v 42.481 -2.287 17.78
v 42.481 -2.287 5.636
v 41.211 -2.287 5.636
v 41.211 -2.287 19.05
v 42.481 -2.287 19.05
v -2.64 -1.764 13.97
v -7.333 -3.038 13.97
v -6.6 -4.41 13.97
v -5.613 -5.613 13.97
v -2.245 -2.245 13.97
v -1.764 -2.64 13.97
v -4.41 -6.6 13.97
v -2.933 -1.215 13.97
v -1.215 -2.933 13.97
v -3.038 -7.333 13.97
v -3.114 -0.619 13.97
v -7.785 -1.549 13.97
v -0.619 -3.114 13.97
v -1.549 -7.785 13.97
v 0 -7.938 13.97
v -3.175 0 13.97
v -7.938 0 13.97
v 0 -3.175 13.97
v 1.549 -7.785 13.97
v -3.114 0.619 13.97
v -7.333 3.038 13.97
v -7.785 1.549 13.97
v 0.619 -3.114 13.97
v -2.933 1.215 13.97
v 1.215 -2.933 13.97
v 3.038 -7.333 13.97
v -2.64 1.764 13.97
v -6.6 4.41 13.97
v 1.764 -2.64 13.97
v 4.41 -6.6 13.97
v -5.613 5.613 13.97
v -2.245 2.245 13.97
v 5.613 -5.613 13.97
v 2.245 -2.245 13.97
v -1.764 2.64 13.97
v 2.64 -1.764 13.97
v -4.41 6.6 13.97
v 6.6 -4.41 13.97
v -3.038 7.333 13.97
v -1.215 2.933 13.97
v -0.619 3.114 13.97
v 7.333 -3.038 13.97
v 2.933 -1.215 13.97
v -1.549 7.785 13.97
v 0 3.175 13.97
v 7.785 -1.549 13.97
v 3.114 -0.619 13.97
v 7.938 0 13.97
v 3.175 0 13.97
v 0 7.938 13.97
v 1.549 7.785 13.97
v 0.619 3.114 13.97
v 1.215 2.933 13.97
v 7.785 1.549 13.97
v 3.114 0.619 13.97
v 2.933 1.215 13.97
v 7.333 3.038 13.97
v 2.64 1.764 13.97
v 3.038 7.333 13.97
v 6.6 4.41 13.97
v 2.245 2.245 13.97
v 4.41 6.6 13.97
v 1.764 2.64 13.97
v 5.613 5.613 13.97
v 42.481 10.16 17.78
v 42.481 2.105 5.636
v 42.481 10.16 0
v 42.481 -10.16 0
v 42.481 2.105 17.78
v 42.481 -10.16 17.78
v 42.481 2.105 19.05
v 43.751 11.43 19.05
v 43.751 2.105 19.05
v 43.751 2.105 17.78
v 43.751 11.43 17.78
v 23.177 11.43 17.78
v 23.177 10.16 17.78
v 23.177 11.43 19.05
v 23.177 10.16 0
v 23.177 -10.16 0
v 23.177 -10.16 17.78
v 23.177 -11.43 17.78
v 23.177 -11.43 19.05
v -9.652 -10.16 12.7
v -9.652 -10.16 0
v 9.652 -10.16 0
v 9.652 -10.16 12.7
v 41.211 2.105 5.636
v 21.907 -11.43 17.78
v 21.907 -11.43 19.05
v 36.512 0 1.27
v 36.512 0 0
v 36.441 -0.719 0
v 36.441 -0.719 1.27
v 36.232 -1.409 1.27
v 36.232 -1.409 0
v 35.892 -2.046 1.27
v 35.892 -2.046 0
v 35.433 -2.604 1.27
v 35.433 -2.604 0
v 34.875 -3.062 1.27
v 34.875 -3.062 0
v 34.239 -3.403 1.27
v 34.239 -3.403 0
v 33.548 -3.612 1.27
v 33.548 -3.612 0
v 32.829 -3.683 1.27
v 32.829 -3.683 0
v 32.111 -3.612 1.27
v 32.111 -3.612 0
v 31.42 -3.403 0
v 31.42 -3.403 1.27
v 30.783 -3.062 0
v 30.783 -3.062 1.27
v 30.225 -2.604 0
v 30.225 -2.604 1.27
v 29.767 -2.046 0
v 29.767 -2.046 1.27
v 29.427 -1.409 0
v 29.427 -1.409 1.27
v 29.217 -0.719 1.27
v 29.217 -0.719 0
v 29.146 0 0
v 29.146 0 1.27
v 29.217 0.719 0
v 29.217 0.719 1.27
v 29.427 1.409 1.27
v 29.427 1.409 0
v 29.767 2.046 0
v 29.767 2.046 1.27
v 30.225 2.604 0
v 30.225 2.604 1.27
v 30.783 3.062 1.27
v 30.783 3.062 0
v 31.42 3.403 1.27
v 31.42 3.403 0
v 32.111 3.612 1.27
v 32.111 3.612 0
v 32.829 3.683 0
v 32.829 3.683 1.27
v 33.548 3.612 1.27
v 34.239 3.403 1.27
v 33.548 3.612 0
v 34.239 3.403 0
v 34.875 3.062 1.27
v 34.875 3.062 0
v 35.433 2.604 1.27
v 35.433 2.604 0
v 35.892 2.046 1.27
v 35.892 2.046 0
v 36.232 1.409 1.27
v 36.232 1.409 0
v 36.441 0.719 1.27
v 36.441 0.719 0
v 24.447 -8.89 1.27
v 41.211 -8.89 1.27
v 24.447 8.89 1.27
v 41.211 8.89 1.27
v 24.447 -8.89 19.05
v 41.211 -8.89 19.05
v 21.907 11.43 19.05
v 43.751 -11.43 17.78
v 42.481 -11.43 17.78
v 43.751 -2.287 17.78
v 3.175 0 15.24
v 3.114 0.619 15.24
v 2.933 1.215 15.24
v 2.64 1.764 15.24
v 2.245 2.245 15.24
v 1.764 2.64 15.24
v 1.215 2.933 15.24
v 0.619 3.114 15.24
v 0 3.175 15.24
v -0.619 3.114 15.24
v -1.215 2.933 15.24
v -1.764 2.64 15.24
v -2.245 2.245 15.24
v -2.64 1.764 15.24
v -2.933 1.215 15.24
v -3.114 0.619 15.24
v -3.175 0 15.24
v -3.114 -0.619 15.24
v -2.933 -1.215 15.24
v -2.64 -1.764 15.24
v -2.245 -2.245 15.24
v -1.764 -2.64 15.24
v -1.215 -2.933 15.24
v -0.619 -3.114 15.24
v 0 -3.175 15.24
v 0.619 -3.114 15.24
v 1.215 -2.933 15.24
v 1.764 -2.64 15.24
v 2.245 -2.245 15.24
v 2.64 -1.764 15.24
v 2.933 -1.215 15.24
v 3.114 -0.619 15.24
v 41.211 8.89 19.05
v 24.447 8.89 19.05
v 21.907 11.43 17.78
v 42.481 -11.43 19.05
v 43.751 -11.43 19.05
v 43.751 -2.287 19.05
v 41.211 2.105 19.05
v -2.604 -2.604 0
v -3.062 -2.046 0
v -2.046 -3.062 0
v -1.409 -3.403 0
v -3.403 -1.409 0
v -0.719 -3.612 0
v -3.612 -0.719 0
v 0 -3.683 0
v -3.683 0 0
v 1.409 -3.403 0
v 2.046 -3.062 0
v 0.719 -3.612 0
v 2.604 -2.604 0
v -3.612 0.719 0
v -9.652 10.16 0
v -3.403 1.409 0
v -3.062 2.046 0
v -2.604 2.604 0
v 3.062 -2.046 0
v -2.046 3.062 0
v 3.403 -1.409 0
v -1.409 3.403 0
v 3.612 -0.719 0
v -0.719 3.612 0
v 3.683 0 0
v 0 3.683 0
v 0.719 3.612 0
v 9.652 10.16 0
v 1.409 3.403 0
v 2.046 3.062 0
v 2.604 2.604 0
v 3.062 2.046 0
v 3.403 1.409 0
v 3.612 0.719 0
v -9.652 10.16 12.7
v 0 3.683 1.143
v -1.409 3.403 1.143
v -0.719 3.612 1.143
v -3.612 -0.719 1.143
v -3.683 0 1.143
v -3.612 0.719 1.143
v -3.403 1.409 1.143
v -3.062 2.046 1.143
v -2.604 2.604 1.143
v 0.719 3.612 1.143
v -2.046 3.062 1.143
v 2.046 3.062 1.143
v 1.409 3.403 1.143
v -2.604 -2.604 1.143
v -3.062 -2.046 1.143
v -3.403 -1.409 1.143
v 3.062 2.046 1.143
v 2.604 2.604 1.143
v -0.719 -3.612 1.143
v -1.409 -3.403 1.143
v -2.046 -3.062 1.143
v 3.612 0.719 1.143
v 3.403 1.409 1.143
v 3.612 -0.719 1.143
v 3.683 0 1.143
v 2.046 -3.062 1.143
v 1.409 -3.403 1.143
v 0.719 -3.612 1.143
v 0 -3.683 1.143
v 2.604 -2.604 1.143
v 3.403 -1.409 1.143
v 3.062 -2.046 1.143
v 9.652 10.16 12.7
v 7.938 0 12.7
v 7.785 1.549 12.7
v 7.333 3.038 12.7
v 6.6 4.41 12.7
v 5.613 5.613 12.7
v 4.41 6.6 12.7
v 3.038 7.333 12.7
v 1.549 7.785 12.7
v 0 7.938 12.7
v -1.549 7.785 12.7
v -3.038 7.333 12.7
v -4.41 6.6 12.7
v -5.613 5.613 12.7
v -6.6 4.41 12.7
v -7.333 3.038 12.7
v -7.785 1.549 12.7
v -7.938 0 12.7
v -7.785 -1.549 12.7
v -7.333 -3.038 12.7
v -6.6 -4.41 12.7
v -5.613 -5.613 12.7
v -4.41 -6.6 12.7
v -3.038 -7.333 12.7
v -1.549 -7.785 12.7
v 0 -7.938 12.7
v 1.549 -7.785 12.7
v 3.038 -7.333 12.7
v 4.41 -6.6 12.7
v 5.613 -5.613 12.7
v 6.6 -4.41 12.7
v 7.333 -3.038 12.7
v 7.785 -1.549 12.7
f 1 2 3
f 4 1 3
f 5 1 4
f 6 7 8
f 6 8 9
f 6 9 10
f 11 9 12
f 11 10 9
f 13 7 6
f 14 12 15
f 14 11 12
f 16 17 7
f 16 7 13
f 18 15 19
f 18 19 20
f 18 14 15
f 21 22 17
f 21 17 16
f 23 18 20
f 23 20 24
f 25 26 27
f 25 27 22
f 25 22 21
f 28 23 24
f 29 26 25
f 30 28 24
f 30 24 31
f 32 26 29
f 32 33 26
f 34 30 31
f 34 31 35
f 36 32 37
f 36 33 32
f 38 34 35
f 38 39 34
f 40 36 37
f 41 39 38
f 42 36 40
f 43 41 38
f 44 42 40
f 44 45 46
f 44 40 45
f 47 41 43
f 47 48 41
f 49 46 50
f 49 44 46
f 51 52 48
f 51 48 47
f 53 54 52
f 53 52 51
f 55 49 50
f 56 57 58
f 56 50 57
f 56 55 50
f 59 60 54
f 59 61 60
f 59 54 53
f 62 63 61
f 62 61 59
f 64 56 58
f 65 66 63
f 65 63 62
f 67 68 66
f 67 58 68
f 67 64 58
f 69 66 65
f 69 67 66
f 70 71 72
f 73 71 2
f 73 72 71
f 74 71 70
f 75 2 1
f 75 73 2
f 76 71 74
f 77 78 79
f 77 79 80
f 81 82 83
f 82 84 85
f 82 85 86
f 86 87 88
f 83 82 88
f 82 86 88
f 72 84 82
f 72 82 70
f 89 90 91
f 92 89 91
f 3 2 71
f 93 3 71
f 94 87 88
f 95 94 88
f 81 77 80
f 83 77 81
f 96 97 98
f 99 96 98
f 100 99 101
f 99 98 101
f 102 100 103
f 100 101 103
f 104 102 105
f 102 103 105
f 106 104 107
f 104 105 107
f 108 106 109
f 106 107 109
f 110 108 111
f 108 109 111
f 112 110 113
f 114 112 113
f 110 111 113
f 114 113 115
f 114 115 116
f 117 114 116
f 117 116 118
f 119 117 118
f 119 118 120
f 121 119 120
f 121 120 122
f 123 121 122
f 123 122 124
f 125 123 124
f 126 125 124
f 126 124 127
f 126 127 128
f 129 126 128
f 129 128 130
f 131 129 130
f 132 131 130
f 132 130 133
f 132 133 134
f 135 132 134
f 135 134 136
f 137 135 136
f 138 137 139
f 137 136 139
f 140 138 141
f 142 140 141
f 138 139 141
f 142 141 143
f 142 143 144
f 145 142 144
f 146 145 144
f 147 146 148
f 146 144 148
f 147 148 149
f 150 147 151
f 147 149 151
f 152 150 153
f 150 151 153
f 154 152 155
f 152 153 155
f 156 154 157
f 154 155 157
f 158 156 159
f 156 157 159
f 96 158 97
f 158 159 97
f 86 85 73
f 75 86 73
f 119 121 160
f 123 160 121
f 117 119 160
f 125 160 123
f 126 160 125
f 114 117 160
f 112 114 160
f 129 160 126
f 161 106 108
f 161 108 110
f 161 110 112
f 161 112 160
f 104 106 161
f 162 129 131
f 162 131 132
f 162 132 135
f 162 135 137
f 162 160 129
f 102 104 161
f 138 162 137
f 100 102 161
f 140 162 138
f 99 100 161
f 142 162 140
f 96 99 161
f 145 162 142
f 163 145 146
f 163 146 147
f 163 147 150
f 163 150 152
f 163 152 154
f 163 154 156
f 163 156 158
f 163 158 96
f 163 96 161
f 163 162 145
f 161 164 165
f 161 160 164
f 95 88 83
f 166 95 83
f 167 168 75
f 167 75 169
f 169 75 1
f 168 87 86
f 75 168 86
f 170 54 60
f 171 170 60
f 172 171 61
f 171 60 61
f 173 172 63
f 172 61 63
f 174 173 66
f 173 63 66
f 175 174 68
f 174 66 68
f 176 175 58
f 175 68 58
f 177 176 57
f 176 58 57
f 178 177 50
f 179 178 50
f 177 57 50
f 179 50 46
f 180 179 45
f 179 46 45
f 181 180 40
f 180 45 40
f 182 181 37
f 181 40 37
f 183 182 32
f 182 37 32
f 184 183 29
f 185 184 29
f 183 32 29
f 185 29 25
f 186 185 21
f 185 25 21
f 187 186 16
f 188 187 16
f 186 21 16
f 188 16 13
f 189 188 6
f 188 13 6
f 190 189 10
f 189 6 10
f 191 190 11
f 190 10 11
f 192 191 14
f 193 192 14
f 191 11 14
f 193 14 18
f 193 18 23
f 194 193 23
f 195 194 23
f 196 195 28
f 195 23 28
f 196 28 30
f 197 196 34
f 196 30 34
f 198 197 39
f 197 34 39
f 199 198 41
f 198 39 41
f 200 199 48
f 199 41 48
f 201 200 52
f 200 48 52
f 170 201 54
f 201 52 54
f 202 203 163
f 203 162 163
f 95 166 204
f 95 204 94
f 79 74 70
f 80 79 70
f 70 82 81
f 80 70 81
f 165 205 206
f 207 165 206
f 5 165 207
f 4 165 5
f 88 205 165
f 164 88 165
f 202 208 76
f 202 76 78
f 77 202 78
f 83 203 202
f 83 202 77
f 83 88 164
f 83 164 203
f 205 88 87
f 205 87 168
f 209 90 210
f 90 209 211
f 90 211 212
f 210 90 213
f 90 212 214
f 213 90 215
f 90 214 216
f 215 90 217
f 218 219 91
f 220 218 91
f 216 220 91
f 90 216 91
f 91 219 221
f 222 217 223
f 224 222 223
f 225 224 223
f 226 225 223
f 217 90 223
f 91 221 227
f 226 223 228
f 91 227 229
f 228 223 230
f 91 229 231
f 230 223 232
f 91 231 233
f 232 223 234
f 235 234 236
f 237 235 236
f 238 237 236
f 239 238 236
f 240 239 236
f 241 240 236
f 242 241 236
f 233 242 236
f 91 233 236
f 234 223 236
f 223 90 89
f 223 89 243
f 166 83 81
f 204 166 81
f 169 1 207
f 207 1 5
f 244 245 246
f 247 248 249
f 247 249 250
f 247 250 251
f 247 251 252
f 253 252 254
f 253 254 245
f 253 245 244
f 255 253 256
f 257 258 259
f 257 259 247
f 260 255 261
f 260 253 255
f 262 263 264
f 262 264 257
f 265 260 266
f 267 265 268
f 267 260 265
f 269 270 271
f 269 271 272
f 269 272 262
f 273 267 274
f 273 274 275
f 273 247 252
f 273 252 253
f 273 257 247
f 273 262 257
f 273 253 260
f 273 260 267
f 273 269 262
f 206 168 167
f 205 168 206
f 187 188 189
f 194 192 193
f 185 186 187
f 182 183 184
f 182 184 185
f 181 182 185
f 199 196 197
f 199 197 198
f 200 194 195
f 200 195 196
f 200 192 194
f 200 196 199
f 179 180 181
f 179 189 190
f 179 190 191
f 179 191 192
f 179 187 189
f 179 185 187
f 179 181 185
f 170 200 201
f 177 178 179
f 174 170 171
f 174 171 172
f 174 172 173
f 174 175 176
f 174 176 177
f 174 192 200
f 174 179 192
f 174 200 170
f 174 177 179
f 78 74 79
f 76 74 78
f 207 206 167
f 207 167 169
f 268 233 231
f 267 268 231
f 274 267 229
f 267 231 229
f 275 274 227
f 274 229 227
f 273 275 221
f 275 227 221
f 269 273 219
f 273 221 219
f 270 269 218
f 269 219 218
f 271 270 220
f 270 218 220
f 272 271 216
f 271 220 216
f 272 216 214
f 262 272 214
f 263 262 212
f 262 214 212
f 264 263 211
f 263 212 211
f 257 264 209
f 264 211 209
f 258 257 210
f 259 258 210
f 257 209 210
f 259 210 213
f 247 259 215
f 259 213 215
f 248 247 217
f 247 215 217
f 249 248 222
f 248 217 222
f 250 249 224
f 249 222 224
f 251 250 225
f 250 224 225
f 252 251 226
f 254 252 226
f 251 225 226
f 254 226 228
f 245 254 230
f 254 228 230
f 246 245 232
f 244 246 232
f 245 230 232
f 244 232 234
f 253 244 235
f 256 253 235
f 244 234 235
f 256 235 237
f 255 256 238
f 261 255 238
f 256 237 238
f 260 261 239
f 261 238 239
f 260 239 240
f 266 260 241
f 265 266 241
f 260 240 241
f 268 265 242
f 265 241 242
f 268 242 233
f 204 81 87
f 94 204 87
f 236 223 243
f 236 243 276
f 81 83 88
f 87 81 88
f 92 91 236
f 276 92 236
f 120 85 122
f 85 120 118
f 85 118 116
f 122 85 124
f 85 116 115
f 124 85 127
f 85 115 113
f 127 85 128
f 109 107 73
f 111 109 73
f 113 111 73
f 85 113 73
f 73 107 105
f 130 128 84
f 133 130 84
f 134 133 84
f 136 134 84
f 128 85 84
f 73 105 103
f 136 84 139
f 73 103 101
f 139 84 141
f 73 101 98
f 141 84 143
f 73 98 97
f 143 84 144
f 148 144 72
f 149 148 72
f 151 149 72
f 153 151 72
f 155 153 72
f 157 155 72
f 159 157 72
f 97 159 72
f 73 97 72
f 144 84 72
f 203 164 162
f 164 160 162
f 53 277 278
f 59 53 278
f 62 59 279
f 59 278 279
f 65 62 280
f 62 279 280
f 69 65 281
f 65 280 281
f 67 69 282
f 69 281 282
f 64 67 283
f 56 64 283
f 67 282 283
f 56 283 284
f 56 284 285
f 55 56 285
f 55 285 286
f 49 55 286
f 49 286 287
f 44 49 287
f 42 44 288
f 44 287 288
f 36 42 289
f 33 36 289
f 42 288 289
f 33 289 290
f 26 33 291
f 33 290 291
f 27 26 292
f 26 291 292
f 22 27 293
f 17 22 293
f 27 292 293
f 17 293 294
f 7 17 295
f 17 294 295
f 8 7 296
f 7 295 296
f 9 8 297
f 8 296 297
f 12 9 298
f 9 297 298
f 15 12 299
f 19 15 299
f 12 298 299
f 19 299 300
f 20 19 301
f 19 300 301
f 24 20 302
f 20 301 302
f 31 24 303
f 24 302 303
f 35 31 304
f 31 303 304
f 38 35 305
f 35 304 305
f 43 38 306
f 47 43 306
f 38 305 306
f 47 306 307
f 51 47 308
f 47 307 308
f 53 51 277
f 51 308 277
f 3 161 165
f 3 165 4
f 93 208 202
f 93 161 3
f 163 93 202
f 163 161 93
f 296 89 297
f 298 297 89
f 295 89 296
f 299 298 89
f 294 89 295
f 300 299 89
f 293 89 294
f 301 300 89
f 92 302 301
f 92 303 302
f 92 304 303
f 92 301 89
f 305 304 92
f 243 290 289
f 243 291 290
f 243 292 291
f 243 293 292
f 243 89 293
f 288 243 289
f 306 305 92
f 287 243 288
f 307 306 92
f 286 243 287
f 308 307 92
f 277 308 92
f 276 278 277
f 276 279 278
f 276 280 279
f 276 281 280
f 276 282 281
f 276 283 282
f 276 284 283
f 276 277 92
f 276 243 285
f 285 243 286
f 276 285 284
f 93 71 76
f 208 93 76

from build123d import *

# Parameters (mm, degrees)
F0_W      = 19.304
F0_H      = 20.32
F1_DEPTH  = 12.7
F2_R      = 7.9375
F3_DEPTH  = 1.27
F4_R      = 3.175
F5_DEPTH  = 1.27
F6_R      = 3.683
F7_DEPTH  = 1.143
F8_W      = 19.304
F8_H      = 20.32
F9_DEPTH  = 19.05
F10_T     = -1.27
F11_W     = 4.392277
F11_H     = 13.413998
F12_DEPTH = 1.778
F13_R     = 3.683
F14_DEPTH = 5.08
F15_W     = 19.304
F15_H     = 1.27
F16_DEPTH = 1.27
F17_W     = 19.304
F17_H     = 1.27
F18_DEPTH = 1.27
F20_DEPTH = 1.27
F21_W     = 9.142821
F21_H     = 1.27
F21_W_2   = 9.324902
F22_DEPTH = 1.27


with BuildPart() as f1:
    # F0 (on Top) → F1 (new body)
    with BuildSketch(Plane.XY):
        Rectangle(F0_W, F0_H)
    extrude(amount=F1_DEPTH)

    # F2 (on face) → F3 (join)
    with BuildSketch(Plane.XY.offset(12.7)):
        Circle(F2_R)
    extrude(amount=F3_DEPTH)

    # F4 (on face) → F5 (join)
    with BuildSketch(Plane.XY.offset(13.97)):
        Circle(F4_R)
    extrude(amount=F5_DEPTH)

    # F6 (on face) → F7 (cut)
    with BuildSketch(Plane(origin=(0, 0, 0), x_dir=(1, 0, 0), z_dir=(0, 0, -1))):
        Circle(F6_R)
    extrude(amount=-F7_DEPTH, mode=Mode.SUBTRACT)


with BuildPart() as f9:
    # F8 (on Top) → F9 (new body)
    with BuildSketch(Plane.XY):
        with Locations((32.829224, 0)):
            Rectangle(F8_W, F8_H)
    extrude(amount=F9_DEPTH)

    # F10
    f10_openings = [f9.faces().sort_by_distance(p)[0] for p in [
        (32.829224, 0, 19.05),
    ]]
    offset(amount=F10_T, openings=f10_openings)

    # F11 (on face) → F12 (cut)
    with BuildSketch(Plane.YZ.offset(42.481224)):
        with Locations((-0.091041, 12.343001)):
            Rectangle(F11_W, F11_H)
    extrude(amount=-F12_DEPTH, mode=Mode.SUBTRACT)

    # F13 (on face) → F14 (cut)
    with BuildSketch(Plane(origin=(0, 0, 0), x_dir=(1, 0, 0), z_dir=(0, 0, -1))):
        with Locations((32.829224, 0)):
            Circle(F13_R)
    extrude(amount=-F14_DEPTH, mode=Mode.SUBTRACT)

    # F15 (on face) → F16 (join)
    with BuildSketch(Plane.XZ.offset(10.16)):
        with Locations((32.829224, 18.415)):
            Rectangle(F15_W, F15_H)
    extrude(amount=F16_DEPTH)

    # F17 (on face) → F18 (join)
    with BuildSketch(Plane(origin=(0, 10.16, 0), x_dir=(-1, 0, 0), z_dir=(0, 1, 0))):
        with Locations((-32.829224, 18.415)):
            Rectangle(F17_W, F17_H)
    extrude(amount=F18_DEPTH)

    # F21 (on face) → F22 (join)
    with BuildSketch(Plane.YZ.offset(42.481224)):
        with Locations((-6.858589, 18.415)):
            Rectangle(F21_W, F21_H)
        with Locations((6.767549, 18.415)):
            Rectangle(F21_W_2, F21_H)
    extrude(amount=F22_DEPTH)


with BuildPart() as f20:
    # F19 (on face) → F20 (new body)
    with BuildSketch(Plane(origin=(23.177224, 0, 0), x_dir=(0, -1, 0), z_dir=(-1, 0, 0))):
        Polygon((11.43, 19.05), (-11.43, 19.05), (-11.43, 17.78), (-10.16, 17.78), (10.16, 17.78), (11.43, 17.78), align=None)
    extrude(amount=F20_DEPTH)


solid = Compound([f1.part, f9.part, f20.part])
